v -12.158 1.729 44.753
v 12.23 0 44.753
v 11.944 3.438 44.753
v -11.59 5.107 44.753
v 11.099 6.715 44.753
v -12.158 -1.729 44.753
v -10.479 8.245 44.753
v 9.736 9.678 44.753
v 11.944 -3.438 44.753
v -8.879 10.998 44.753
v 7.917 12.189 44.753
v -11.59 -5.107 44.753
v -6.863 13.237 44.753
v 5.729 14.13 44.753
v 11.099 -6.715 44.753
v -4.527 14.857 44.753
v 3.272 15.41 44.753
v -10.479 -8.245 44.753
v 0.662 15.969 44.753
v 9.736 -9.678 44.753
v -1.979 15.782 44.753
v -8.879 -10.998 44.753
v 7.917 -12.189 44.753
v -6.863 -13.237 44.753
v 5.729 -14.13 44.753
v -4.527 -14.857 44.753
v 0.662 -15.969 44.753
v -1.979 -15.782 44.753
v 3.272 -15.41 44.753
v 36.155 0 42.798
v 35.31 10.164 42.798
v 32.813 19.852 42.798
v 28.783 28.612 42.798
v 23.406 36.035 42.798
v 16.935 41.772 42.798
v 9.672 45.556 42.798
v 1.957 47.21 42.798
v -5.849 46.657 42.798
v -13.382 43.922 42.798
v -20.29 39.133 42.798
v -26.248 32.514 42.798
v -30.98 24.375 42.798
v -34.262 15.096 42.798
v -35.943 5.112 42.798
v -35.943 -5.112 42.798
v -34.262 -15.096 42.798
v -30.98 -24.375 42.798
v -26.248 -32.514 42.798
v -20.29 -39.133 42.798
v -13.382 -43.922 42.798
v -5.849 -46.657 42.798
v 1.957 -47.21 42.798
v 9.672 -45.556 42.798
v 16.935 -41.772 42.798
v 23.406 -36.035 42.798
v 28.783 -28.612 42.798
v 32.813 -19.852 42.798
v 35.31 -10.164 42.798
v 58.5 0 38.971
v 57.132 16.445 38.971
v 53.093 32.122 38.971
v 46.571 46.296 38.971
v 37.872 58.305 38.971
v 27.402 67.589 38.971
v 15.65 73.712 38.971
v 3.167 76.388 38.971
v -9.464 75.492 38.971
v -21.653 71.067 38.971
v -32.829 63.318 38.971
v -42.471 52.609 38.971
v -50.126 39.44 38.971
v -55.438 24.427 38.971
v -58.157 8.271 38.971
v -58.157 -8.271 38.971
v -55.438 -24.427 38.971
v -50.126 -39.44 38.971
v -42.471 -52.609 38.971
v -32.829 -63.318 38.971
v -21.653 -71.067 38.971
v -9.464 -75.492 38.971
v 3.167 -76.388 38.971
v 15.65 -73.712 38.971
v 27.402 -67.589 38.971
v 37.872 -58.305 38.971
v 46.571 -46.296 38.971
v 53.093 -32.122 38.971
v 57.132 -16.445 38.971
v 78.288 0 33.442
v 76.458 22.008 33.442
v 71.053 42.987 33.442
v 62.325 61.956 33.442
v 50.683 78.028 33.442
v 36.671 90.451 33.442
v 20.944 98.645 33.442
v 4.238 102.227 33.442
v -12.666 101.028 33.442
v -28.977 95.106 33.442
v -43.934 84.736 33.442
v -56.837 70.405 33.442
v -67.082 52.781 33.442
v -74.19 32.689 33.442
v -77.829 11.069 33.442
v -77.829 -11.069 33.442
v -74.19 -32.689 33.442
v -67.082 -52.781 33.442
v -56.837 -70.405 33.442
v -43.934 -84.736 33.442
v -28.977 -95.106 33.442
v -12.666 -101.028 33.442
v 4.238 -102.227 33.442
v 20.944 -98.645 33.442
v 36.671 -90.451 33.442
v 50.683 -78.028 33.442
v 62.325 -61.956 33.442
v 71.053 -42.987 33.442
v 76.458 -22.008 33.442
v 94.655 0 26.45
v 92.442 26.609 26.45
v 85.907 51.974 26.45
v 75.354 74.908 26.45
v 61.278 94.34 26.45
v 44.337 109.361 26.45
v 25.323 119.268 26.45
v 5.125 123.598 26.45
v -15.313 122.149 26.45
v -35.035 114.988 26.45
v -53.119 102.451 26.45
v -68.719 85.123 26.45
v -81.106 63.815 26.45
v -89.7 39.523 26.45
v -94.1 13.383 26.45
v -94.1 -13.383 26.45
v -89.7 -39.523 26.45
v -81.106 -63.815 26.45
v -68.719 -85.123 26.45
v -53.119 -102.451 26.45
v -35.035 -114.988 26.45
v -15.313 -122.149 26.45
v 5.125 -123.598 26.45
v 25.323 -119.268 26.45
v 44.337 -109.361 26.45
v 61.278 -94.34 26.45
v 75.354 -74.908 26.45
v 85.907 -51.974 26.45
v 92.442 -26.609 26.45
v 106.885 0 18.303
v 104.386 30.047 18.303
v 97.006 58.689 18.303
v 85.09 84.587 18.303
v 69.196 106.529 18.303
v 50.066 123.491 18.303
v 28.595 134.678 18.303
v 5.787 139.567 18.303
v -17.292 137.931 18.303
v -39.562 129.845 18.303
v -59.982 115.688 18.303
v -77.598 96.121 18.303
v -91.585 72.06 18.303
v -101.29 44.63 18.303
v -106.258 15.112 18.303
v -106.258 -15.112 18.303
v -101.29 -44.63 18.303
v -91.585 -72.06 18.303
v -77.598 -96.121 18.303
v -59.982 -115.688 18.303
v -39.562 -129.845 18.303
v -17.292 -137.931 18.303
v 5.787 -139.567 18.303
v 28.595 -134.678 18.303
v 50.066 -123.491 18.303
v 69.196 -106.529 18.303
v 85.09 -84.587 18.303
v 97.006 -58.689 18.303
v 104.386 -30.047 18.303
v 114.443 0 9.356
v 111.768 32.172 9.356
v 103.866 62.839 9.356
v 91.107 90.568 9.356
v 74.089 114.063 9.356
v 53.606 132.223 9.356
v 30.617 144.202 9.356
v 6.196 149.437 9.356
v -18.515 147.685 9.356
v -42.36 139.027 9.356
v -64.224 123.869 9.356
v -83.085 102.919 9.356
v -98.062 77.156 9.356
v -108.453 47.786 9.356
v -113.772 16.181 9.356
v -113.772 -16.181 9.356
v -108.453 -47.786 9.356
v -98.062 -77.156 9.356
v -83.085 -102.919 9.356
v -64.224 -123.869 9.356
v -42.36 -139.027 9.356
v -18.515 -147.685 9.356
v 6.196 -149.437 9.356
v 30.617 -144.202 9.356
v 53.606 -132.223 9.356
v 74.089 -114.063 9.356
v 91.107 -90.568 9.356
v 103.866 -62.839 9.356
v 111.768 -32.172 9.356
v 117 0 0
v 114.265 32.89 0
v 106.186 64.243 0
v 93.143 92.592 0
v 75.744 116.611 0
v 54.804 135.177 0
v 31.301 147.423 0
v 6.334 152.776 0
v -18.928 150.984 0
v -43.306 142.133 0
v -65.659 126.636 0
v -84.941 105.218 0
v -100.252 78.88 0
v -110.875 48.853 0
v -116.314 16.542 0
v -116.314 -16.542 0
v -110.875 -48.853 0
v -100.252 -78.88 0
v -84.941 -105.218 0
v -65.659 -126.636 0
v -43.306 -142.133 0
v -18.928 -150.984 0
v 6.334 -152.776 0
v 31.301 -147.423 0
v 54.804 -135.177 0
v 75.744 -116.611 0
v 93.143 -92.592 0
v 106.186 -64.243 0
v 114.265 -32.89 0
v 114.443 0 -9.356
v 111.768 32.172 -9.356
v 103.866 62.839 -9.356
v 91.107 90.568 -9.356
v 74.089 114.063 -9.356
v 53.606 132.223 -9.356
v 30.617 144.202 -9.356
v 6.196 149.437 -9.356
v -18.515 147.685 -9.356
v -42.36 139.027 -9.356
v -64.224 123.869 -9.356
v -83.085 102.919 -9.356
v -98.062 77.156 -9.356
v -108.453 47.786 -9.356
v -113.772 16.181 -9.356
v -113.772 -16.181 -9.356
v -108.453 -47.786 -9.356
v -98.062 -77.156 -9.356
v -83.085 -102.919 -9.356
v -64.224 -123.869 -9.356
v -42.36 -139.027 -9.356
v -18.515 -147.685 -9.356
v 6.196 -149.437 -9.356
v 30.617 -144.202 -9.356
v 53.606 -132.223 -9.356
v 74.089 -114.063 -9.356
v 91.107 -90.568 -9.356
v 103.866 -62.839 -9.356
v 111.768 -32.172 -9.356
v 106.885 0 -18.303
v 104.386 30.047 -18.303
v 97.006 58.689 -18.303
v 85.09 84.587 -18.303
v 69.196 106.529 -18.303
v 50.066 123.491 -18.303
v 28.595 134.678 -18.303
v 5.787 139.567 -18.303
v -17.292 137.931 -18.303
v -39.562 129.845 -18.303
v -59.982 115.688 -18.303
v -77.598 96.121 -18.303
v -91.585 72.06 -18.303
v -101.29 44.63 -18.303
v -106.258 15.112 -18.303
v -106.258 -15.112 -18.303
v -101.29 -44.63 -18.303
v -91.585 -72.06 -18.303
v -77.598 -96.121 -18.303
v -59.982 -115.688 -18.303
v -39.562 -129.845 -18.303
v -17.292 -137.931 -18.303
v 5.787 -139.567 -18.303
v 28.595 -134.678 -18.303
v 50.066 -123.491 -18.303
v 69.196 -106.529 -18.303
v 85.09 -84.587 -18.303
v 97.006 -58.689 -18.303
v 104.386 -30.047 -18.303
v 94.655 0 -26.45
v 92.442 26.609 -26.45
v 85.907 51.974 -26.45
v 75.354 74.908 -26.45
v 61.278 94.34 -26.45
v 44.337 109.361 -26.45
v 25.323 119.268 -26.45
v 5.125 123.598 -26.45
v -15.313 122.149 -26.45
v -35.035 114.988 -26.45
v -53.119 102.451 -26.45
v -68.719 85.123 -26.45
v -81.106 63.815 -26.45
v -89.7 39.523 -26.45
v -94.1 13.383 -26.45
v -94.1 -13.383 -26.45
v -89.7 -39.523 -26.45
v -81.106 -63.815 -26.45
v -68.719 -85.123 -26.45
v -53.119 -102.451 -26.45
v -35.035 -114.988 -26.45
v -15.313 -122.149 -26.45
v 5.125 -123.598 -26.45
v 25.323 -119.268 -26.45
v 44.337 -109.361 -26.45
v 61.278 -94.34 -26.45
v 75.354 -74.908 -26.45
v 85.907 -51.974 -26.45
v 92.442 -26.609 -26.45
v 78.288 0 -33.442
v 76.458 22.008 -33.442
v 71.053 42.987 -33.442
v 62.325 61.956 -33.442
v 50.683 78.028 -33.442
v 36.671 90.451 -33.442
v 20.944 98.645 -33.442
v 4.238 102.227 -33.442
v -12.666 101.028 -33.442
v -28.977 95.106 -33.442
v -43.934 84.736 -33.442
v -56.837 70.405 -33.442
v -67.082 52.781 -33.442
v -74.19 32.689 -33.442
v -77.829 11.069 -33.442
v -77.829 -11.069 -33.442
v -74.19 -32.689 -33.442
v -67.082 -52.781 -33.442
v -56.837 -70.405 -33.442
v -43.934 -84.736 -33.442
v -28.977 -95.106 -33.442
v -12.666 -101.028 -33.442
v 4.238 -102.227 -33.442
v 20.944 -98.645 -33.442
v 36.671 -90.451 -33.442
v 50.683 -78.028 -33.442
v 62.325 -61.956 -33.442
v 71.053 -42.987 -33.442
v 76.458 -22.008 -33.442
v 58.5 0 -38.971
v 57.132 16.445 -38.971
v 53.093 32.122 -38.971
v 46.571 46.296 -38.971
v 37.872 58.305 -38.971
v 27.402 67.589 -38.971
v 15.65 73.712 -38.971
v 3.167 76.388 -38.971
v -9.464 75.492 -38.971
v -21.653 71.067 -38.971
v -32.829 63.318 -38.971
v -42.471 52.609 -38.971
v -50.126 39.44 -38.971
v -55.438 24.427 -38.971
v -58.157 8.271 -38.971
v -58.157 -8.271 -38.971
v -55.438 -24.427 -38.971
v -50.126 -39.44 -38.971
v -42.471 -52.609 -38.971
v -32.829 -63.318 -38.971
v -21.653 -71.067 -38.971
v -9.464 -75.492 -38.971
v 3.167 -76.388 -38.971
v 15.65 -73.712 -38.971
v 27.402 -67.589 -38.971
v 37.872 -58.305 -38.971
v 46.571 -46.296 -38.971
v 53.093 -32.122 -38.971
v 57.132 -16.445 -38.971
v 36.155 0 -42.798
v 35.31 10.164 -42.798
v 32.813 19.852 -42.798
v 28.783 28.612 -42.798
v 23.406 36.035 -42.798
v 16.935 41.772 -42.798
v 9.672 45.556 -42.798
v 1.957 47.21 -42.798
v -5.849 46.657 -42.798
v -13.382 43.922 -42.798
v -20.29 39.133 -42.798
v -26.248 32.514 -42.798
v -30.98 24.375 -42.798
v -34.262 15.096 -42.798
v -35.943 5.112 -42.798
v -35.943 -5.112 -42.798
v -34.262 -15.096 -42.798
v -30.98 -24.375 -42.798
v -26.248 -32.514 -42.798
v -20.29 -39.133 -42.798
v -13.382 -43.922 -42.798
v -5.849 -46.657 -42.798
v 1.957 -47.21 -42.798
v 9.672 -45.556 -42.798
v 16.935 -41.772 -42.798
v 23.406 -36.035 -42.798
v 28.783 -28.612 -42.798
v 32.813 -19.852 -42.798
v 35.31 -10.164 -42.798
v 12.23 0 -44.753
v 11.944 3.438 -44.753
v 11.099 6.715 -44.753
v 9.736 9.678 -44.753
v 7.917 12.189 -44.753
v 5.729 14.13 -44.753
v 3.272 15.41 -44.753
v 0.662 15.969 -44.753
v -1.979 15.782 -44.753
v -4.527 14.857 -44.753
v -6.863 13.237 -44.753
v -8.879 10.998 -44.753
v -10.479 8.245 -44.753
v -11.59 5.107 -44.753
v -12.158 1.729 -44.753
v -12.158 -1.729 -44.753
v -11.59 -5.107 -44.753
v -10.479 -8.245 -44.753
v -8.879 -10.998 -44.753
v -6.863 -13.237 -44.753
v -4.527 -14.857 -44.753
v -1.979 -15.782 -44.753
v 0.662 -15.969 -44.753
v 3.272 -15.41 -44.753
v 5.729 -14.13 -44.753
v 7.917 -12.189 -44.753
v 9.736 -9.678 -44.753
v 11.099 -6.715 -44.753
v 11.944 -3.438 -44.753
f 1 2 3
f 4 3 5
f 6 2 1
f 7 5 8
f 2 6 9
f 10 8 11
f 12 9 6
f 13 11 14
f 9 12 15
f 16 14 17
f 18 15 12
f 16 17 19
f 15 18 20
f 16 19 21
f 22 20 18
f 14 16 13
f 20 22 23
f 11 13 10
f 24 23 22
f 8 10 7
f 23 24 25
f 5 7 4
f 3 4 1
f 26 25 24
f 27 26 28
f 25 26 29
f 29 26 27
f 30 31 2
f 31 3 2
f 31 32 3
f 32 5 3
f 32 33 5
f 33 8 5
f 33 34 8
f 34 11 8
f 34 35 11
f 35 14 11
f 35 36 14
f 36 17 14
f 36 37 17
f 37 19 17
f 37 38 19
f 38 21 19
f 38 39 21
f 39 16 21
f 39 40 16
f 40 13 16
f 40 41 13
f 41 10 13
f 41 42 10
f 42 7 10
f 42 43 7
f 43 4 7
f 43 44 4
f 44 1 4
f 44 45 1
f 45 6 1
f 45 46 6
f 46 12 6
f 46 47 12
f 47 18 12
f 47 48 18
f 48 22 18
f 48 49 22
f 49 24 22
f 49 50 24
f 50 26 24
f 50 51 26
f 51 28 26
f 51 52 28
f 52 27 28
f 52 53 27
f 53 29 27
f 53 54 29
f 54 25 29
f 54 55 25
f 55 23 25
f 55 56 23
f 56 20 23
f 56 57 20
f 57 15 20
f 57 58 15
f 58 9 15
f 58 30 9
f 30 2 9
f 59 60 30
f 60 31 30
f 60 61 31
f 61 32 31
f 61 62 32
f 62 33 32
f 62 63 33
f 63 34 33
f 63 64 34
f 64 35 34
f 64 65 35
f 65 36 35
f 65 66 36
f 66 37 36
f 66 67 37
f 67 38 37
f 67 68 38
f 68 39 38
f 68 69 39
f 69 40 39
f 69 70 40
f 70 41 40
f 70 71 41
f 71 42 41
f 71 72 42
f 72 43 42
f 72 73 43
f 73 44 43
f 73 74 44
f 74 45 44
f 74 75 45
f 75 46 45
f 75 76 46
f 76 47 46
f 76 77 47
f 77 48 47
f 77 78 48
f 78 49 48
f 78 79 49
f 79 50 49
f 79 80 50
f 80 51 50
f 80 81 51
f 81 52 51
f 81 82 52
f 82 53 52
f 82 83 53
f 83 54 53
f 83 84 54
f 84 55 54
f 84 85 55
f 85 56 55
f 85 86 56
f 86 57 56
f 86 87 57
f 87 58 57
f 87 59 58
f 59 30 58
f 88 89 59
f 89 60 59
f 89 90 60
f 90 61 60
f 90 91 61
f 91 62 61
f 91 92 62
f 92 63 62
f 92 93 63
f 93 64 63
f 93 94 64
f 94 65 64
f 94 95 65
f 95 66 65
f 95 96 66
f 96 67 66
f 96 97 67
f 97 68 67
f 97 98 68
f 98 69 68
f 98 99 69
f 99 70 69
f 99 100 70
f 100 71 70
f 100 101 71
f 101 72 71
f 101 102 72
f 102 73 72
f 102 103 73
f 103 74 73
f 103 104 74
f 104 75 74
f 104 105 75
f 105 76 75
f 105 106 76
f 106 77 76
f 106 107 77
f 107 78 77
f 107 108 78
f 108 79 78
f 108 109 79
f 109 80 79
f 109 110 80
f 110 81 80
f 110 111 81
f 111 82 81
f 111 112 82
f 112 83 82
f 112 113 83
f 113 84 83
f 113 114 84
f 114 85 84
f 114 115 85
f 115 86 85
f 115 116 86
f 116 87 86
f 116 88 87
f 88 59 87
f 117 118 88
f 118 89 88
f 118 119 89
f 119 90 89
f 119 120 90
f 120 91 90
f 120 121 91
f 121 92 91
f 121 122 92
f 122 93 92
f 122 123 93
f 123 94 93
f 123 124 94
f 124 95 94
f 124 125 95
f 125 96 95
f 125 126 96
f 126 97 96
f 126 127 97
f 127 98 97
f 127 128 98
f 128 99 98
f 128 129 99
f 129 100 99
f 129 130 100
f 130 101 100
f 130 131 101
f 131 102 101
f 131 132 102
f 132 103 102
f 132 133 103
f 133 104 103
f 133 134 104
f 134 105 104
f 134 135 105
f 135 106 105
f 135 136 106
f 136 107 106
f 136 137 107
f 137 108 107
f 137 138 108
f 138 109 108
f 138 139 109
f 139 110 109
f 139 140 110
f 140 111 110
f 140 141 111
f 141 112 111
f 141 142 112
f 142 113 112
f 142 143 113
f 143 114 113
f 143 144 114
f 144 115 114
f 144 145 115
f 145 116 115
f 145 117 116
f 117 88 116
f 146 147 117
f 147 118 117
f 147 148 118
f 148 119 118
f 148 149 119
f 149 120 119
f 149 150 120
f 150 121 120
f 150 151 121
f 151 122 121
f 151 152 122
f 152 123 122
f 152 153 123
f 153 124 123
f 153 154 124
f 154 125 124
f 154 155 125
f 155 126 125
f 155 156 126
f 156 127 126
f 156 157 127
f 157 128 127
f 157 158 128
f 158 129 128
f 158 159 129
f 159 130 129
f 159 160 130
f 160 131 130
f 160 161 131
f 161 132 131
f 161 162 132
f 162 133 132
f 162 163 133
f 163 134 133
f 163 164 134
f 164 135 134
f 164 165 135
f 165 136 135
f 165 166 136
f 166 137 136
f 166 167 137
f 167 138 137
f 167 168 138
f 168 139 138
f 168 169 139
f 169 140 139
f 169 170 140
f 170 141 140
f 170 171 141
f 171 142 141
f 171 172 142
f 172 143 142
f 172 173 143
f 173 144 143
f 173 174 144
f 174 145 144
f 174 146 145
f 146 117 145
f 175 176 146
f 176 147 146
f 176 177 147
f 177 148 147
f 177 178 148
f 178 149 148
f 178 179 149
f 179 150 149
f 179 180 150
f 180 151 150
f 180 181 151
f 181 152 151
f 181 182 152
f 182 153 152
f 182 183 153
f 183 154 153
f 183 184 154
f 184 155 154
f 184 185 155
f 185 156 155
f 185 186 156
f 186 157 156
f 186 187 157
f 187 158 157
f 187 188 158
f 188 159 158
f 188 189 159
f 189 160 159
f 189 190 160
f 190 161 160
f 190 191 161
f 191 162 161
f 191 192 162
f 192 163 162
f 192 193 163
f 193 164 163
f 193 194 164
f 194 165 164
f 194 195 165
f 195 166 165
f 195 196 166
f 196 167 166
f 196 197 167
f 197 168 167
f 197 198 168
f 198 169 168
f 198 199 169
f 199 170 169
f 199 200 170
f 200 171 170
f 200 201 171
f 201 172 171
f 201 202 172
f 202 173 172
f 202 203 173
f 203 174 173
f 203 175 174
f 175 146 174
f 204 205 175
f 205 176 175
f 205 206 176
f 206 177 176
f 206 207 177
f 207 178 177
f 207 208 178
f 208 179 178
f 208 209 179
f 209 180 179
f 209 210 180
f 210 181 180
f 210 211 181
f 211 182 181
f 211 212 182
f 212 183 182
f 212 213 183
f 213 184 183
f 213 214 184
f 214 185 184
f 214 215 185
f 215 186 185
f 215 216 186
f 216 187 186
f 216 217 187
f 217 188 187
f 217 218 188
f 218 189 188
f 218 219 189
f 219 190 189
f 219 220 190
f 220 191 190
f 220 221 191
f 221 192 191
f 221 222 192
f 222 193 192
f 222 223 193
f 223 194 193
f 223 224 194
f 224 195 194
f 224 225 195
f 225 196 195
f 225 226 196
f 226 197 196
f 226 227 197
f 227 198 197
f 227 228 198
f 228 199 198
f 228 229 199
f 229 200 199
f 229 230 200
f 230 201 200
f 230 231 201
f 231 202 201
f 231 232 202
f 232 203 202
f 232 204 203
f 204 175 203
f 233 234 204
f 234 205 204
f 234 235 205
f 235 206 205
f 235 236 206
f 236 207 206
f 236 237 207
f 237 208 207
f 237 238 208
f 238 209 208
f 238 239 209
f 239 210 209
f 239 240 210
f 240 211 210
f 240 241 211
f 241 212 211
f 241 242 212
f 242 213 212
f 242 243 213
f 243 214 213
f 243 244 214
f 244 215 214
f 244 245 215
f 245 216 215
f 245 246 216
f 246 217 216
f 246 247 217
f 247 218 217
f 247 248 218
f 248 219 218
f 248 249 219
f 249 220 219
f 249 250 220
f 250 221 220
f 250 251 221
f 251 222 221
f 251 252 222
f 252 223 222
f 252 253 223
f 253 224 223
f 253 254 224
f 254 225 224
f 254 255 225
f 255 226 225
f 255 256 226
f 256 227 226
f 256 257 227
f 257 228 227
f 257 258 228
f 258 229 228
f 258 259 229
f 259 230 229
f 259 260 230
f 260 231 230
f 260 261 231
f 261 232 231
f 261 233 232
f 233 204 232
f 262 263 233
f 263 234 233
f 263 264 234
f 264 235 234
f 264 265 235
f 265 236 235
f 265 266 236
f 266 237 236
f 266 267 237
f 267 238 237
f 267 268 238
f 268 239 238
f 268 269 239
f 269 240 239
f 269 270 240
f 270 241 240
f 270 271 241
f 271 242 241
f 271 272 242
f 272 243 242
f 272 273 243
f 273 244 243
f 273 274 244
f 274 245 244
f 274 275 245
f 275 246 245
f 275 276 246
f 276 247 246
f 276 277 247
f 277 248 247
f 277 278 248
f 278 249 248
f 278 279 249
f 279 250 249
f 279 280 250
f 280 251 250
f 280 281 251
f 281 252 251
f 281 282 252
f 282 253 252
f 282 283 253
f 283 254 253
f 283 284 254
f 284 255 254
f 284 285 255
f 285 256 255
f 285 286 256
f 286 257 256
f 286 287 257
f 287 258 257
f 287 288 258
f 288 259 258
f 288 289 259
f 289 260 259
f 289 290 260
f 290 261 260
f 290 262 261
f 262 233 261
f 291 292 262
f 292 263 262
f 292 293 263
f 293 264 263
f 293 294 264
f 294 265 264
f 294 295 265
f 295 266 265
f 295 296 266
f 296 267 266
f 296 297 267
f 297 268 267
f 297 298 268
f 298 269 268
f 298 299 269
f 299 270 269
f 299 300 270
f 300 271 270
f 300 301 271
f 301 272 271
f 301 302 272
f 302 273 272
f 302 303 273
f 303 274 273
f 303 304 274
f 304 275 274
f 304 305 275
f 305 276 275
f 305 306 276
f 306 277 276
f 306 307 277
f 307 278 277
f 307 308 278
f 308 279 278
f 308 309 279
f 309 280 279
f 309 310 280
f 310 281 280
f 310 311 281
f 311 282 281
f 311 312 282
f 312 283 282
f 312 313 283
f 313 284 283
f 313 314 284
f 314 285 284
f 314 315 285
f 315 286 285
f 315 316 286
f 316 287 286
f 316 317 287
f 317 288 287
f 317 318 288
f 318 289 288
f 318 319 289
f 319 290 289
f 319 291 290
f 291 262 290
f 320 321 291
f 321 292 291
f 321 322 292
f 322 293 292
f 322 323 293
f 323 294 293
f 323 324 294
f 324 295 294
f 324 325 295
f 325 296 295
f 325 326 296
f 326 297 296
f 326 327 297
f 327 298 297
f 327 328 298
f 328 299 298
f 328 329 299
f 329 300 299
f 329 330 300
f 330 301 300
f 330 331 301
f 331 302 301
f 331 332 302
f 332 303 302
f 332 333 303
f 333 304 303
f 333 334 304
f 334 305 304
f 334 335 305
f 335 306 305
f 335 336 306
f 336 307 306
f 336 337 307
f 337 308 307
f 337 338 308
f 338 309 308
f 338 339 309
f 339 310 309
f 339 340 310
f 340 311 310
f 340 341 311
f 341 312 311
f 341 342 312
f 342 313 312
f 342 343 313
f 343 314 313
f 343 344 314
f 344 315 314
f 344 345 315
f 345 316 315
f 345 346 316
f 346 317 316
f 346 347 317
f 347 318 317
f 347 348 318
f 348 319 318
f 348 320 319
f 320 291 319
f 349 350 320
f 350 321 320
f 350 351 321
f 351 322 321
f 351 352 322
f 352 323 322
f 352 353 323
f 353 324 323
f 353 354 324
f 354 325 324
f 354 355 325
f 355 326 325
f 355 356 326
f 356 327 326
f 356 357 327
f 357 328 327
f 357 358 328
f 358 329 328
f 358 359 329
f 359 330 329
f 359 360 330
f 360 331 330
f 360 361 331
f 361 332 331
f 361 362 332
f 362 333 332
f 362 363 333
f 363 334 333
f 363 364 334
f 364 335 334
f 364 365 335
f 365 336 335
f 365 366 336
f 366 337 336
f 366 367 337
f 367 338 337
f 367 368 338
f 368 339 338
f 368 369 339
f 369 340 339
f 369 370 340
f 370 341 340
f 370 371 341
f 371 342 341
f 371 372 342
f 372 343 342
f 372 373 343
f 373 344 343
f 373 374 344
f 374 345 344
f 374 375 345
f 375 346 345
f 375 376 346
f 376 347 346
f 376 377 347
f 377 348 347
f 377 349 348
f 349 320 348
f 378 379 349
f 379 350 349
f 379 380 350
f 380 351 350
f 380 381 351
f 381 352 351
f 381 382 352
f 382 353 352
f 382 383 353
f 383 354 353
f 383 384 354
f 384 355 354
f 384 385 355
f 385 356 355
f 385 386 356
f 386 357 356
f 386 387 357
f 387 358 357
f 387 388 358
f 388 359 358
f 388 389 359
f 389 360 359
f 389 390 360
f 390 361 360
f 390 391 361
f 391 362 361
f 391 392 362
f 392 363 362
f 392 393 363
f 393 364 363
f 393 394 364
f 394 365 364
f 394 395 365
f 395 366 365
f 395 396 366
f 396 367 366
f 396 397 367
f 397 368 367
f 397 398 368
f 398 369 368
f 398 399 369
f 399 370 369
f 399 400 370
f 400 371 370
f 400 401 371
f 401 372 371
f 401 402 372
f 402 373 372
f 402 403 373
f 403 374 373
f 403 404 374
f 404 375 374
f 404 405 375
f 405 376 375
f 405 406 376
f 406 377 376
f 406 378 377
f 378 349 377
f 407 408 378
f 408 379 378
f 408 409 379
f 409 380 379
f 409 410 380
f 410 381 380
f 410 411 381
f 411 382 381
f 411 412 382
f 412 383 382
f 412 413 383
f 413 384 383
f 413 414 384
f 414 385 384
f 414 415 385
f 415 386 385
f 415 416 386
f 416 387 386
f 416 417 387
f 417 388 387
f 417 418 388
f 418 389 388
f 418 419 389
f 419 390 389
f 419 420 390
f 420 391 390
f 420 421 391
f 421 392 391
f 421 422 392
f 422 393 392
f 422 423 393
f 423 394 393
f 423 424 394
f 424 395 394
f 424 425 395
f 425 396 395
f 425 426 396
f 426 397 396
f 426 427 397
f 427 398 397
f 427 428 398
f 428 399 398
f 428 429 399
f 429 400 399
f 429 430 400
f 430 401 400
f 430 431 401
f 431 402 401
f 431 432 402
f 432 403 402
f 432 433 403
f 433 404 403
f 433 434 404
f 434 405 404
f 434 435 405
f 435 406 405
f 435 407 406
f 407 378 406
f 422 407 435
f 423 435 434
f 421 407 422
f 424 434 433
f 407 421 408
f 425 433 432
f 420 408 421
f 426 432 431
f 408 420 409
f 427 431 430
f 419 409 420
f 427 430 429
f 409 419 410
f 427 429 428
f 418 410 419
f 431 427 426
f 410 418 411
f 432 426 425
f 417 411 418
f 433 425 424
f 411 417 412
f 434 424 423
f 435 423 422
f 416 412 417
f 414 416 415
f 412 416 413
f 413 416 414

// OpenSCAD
// Generated by SolidPython 1.0.1 on 2020-07-29 00:46:51


scale(v = [13, 17, 5]) {
	sphere(r = 9);
}
/***********************************************
*********      SolidPython code:      **********
************************************************
 
# import packages: SolidPython
from solid import *
from solid.utils import *
from itertools import chain, combinations, permutations


class Resize:

    def __init__(self, scad_file):
        self.scad_file = scad_file
        #self.scad_file = import_scad(scad_file)
        # cone/cylinder param:
        self.r1 = 0
        self.r2 = 0
        self.h = 0
        # rectangular prism param:
        self.w = 0
        self.l = 0
        # ellipse param:
        self.r = 0

    # import OpenScad code (file name corresponds to shape)


    # classify shape + parameters
    def assign(self, param1, param2, param3):
        if self.scad_file == 'cone.scad':
            self.r1 = param1
            self.r2 = param2
            self.h = param3
        elif self.scad_file == 'cylinder.scad':
            self.r1 = param1
            self.r2 = param2
            self.h = param3
        elif self.scad_file == 'rectangularPrism.scad':
            self.h = param1
            self.l = param2
            self.w = param3
        else:
            self.r = param1
            self.h = param2

    # resize parameters
    def iterate(self):
        x = range(3, 20, 2)
        i = 1
        if self.scad_file == 'cone.scad':
            tempList = list(permutations(x, 2))
            for temp in tempList:
                param1 = temp[0]
                param2 = temp[1]
                filepath = 'produced_scad_files/' + 'cone' + str(param1) + '_' + str(param2) + '_' + '.scad'
                scad_render_to_file(cylinder(h=param1, r1=param2, r2=0), filepath)

        elif self.scad_file == 'cylinder.scad':
            tempList = list(permutations(x, 3))
            for temp in tempList:
                param1 = temp[0]
                param2 = temp[1]
                filepath = 'produced_scad_files/' + 'cylinder' + str(param1) + '_' + str(param2) + '_' + '.scad'
                scad_render_to_file(cylinder(h=param1, r1=param2, r2=param2), filepath)

        elif self.scad_file == 'rectangularPrism.scad':
            tempList = list(permutations(x, 3))
            for temp in tempList:
                param1 = temp[0]
                param2 = temp[1]
                param3 = temp[2]
                filepath = 'produced_scad_files/' + 'rectangularPrism' + str(param1) + '_' + str(param2) + '_' + str(
                    param3) + '.scad'
                scad_render_to_file(cube(size=(param1, param2, param3)), filepath)

        elif self.scad_file == 'ellipse.scad':
            tempList = list(permutations(x, 4))
            for temp in tempList:
                param1 = temp[0]
                param2 = temp[1]
                param3 = temp[2]
                param4 = temp[3]
                filepath = 'produced_scad_files/' + 'ellipse' + str(param1) + '_' + str(param2) + '_' + str(param3) + '_' + str(param4) + '.scad'
                scad_render_to_file(scale([param1, param2, param3])(sphere(r=param4)), filepath)

    def render_to_scadfile(self):
        scad_render_to_file(scad, 'example.scad') 
 
************************************************/
